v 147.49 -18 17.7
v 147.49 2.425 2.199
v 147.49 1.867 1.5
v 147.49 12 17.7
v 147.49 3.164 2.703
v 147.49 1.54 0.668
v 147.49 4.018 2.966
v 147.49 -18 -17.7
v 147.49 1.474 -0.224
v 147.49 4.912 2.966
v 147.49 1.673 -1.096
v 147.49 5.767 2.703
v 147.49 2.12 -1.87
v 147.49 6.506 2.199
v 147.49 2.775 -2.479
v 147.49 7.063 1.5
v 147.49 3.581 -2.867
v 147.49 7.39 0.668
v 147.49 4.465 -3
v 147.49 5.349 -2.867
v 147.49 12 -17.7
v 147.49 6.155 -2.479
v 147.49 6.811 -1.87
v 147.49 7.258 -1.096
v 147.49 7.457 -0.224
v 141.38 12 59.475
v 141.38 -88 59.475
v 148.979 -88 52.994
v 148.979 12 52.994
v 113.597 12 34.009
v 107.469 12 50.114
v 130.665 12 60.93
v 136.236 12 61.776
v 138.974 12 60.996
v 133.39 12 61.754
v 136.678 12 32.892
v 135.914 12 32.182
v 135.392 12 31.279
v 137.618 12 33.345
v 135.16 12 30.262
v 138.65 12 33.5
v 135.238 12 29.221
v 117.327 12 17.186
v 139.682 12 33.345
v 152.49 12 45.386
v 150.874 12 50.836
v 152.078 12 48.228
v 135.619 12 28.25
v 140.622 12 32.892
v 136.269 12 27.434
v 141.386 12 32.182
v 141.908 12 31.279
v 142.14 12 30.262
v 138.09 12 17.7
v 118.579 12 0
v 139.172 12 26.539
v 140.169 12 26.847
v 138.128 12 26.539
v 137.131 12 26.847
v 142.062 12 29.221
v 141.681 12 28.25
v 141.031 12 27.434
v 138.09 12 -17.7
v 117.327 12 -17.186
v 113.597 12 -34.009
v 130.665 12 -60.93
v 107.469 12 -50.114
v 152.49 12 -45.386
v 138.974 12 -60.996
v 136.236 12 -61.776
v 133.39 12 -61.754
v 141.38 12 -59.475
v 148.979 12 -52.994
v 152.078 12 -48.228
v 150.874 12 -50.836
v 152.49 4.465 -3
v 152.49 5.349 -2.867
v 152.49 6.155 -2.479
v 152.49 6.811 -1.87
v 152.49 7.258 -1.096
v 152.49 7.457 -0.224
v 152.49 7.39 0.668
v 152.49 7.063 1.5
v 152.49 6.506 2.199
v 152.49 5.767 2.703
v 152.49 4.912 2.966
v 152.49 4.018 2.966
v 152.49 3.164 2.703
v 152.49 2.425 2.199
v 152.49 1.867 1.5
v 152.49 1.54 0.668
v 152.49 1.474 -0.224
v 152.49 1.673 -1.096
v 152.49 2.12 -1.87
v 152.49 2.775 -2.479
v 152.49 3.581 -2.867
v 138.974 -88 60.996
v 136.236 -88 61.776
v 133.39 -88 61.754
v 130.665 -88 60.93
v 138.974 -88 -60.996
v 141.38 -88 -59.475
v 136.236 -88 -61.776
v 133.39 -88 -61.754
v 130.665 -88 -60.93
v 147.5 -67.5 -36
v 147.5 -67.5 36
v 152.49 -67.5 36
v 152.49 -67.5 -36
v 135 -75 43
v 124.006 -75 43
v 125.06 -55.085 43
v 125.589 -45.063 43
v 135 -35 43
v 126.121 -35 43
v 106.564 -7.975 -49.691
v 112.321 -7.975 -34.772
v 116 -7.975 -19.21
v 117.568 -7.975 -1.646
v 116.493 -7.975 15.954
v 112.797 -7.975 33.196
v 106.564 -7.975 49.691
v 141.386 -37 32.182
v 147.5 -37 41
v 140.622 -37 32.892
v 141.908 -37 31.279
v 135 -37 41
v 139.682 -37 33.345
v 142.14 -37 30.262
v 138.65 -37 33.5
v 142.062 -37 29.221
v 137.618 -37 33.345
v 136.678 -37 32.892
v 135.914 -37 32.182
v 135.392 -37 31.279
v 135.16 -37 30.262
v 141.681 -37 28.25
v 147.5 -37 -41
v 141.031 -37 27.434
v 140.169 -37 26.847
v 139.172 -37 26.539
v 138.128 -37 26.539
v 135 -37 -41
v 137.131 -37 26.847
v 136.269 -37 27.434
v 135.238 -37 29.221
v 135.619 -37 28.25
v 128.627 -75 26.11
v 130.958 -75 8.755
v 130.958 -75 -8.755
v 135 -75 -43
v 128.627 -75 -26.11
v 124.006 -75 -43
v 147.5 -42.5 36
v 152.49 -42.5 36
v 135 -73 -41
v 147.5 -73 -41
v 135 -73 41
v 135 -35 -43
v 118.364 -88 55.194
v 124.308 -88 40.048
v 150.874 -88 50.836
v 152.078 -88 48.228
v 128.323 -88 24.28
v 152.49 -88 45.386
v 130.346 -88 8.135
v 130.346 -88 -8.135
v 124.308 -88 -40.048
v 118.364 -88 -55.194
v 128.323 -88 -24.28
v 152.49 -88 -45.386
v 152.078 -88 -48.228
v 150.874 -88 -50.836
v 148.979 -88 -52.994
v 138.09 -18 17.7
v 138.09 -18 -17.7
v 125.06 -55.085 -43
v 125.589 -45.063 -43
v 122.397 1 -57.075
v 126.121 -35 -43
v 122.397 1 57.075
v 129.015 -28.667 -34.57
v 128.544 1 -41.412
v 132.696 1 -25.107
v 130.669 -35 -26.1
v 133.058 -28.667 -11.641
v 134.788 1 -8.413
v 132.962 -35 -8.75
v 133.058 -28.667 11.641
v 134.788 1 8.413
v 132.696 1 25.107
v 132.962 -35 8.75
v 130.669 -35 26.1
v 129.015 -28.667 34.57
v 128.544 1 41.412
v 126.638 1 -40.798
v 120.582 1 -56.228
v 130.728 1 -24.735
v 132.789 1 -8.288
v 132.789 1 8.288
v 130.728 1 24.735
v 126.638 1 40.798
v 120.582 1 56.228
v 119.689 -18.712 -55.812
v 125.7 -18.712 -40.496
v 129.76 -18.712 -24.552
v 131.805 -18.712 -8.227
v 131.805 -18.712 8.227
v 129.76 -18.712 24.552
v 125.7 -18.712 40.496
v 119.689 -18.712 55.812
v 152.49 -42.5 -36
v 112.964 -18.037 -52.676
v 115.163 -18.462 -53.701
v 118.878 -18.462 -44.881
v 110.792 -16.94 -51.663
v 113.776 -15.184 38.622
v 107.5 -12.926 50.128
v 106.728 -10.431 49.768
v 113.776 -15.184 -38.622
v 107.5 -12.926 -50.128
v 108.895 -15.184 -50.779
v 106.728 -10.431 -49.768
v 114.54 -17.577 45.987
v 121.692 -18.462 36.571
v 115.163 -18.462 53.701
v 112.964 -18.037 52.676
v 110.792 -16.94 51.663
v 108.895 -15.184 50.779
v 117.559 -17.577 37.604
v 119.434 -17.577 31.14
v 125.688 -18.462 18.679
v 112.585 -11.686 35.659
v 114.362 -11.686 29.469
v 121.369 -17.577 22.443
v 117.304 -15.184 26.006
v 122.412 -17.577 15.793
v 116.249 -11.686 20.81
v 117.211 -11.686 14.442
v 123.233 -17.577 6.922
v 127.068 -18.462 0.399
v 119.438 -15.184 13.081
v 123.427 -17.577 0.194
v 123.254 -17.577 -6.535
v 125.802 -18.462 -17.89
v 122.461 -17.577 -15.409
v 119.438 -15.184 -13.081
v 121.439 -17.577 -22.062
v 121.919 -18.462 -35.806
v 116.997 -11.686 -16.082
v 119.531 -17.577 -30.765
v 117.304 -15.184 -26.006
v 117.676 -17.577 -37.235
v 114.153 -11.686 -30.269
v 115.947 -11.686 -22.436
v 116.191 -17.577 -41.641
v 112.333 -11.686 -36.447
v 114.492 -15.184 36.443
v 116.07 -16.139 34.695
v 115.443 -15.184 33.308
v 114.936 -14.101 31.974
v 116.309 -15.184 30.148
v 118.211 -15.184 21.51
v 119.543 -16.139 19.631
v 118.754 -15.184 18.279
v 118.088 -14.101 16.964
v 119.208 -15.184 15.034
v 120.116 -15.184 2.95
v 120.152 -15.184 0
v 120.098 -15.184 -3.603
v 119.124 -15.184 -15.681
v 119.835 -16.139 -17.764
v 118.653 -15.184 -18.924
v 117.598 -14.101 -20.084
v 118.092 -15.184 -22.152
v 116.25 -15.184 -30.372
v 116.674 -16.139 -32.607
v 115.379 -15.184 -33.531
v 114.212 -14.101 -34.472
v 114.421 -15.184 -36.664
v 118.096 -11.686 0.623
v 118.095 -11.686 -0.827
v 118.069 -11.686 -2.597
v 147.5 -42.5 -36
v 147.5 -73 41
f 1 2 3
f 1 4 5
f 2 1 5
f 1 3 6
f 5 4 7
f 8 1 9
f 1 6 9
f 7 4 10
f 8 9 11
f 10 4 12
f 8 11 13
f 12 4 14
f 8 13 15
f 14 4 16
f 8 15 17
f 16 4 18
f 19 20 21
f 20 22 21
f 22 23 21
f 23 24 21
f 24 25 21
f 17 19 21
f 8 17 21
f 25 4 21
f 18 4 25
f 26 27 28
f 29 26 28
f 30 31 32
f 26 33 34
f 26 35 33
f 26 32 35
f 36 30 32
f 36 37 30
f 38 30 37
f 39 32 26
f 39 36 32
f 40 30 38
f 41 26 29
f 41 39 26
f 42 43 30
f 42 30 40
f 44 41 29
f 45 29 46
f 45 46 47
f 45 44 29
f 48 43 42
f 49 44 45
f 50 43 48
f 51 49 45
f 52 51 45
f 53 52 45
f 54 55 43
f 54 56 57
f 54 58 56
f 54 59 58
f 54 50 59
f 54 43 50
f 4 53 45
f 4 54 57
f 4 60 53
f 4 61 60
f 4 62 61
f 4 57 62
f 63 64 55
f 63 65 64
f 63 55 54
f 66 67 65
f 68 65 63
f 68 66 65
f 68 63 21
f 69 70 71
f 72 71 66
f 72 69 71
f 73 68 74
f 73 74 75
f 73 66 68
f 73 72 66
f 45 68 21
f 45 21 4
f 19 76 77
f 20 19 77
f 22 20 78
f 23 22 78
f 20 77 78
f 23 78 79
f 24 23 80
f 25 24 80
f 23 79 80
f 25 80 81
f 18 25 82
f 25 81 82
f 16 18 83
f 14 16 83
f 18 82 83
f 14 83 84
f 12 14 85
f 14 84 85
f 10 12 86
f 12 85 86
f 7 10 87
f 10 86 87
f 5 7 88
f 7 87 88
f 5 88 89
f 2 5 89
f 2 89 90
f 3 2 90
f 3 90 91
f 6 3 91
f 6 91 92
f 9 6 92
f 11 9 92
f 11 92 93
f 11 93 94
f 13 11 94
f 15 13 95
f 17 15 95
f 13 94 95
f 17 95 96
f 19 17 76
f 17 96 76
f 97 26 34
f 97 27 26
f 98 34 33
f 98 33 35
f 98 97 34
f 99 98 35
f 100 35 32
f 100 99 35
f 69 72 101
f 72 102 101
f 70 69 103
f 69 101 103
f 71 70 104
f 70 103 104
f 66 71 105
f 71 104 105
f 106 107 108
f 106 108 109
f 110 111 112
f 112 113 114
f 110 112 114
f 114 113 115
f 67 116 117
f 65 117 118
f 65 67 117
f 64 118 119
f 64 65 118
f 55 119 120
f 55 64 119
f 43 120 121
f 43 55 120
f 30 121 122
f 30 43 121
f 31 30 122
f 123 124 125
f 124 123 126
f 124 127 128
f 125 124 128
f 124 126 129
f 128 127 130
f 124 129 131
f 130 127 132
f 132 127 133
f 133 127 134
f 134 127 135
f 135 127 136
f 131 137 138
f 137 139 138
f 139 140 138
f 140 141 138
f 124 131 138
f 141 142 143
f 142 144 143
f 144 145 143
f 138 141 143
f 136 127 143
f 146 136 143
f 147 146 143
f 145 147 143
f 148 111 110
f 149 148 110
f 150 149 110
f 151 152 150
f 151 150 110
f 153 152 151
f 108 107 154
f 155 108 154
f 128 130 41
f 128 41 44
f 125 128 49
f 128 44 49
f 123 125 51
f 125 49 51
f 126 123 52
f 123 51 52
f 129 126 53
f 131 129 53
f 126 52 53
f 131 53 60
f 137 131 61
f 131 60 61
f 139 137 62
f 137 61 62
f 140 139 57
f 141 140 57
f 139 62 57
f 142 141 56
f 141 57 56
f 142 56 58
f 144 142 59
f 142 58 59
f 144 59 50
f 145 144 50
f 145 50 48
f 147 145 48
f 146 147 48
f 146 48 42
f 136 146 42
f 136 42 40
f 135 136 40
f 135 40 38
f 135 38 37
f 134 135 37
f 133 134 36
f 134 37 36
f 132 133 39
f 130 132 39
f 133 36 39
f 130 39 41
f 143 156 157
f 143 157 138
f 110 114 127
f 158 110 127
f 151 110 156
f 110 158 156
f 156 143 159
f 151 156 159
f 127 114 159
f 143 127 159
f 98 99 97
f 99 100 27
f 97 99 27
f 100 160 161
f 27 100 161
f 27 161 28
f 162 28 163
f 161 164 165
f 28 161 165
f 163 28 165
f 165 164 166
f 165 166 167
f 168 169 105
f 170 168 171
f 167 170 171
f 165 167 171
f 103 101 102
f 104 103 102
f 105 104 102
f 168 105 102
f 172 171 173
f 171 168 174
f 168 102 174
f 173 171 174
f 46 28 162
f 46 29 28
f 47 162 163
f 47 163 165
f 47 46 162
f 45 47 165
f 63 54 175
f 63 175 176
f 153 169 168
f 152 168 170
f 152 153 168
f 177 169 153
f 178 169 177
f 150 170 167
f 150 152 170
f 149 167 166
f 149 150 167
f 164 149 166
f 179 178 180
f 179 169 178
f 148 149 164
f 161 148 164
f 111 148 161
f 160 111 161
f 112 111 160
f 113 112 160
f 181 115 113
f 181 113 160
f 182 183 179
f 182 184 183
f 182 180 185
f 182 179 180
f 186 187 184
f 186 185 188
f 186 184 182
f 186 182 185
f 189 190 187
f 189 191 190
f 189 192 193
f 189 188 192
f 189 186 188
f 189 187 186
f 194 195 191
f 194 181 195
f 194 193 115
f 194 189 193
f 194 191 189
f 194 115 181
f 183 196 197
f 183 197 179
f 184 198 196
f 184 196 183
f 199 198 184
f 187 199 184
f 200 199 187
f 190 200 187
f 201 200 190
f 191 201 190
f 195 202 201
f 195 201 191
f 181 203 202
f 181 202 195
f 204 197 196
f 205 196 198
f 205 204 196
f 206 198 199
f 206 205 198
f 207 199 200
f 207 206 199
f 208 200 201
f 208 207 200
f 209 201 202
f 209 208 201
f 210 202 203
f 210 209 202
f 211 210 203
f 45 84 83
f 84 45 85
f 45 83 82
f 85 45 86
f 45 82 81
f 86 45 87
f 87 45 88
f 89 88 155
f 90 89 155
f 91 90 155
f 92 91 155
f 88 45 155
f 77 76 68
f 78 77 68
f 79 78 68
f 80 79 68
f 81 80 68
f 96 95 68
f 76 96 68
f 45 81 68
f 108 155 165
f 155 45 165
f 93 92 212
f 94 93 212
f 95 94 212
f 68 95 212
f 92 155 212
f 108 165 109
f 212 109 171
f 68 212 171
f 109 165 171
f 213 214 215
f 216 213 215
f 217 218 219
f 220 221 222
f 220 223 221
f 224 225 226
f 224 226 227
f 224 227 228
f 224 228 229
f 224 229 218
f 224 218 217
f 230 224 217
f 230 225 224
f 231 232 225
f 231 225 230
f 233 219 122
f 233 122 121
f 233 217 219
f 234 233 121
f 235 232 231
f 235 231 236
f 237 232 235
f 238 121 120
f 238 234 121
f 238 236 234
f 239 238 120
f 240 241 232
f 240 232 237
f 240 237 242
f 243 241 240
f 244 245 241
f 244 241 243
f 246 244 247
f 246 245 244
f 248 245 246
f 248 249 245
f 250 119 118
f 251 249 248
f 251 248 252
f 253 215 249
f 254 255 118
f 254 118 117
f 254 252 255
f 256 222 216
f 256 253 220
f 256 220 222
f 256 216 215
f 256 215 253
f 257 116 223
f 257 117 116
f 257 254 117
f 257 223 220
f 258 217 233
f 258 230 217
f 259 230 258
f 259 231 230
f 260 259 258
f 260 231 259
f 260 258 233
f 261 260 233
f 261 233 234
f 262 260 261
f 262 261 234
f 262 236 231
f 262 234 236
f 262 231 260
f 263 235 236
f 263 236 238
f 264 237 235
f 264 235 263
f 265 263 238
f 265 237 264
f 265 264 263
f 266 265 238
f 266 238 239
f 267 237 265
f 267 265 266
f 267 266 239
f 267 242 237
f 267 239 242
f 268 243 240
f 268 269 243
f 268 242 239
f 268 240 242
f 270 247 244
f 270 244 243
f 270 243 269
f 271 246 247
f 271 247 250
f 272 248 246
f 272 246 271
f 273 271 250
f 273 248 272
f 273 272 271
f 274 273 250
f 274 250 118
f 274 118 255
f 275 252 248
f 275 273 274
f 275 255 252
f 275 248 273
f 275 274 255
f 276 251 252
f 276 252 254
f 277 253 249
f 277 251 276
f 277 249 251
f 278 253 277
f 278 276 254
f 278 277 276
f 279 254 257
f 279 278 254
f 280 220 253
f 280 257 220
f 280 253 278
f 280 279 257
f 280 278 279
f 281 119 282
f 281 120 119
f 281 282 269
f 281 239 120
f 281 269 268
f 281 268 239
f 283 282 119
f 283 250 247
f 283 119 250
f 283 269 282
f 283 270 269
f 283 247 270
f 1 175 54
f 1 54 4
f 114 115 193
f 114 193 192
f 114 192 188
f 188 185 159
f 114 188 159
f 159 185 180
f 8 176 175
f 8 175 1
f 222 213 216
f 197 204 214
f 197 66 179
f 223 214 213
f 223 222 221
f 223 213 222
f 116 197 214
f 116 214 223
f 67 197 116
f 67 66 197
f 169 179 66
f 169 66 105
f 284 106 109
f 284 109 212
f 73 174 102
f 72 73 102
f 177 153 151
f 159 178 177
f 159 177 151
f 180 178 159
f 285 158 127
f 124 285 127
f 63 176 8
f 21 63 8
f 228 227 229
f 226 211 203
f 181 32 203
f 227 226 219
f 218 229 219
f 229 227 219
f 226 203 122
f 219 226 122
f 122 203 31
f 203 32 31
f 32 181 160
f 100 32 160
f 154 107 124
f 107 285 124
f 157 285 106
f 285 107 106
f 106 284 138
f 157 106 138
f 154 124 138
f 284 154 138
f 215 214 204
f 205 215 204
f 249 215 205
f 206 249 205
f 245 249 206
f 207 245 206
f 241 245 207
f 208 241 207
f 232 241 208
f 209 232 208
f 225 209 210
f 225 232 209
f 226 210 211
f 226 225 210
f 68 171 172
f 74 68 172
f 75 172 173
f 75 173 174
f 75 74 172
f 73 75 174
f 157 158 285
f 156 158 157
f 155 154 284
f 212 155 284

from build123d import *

# Parameters (mm, degrees)
REVOLU_O2_ANGLE          = 50
RESSALTO_EXTRUS_O1_START = -100
RESSALTO_EXTRUS_O1_DEPTH = 100
ESBO_O9_W                = 82
ESBO_O9_H                = 36
CORTE_EXTRUS_O6_DEPTH    = 147.5
ESBO_O11_W               = 72
ESBO_O11_H               = 25
CORTE_EXTRUS_O7_DEPTH    = 172
ESBO_O15_R               = 3.5
CORTE_EXTRUS_O8_DEPTH    = 49
ESBO_O16_W               = 86
ESBO_O16_H               = 40
ESBO_O16_W_2             = 82
ESBO_O16_H_2             = 36
CORTE_EXTRUS_O9_DEPTH    = 135
ESBO_O17_W               = 9.4
ESBO_O17_H               = 35.4
CORTE_EXTRUS_O10_DEPTH   = 30
ESBO_O18_R               = 3
CORTE_EXTRUS_O12_DEPTH   = 5
FILETE1_R                = 10


with BuildPart() as part:
    # Esboço1 → Revolução2 (revolve, symmetric)
    with BuildSketch(Plane.XY) as revolu_o2_sk:
        Polygon((133.047501561, 1), (132.06191984, -18.71163442), (117.080634756, -17.962570166), (118.578763265, 12), (150.6, 12), (150.6, -88), (130.6, -88), (135.05, 1), align=None)
    revolve(axis=Axis((0, -200, 0), (0, 1, 0)), revolution_arc=REVOLU_O2_ANGLE / 2)
    revolve(revolu_o2_sk.sketch, axis=Axis((0, -200, 0), (0, -1, 0)), revolution_arc=REVOLU_O2_ANGLE / 2)

    # Esboço10 → Ressalto-extrusão1 (add)
    with BuildSketch(Plane(origin=(0, 12, 0), x_dir=(1, 0, 0), z_dir=(0, 1, 0)).offset(RESSALTO_EXTRUS_O1_START)):
        with BuildLine():
            Line((152.489952728, 0), (150.6, 0))
            ThreePointArc((150.6, 0), (147.030178672, -32.595805859), (136.489952728, -63.646310218))
            Line((136.489952728, -63.646310218), (152.489952728, -50))
            Line((152.489952728, -50), (152.489952728, 0))
        make_face()
        with BuildLine():
            Line((152.489952728, 50), (136.489952728, 63.646310218))
            ThreePointArc((136.489952728, 63.646310218), (147.030178672, 32.595805859), (150.6, 0))
            Line((150.6, 0), (152.489952728, 0))
            Line((152.489952728, 0), (152.489952728, 50))
        make_face()
    extrude(amount=RESSALTO_EXTRUS_O1_DEPTH)

    # Esboço9 → Corte-extrusão6 (cut)
    with BuildSketch(Plane(origin=(0, 0, 0), x_dir=(0, 0, -1), z_dir=(1, 0, 0))):
        with Locations((0, -55)):
            Rectangle(ESBO_O9_W, ESBO_O9_H)
    extrude(amount=CORTE_EXTRUS_O6_DEPTH, mode=Mode.SUBTRACT)

    # Esboço11 → Corte-extrusão7 (cut)
    with BuildSketch(Plane(origin=(0, 0, 0), x_dir=(0, 0, -1), z_dir=(1, 0, 0))):
        with Locations((0, -55)):
            Rectangle(ESBO_O11_W, ESBO_O11_H)
    extrude(amount=CORTE_EXTRUS_O7_DEPTH, mode=Mode.SUBTRACT)

    # Esboço15 → Corte-extrusão8 (cut)
    with BuildSketch(Plane(origin=(0, 12, 0), x_dir=(1, 0, 0), z_dir=(0, 1, 0))):
        with Locations(Location((138.649952728, -30, 0), (0, 0, 270))):
            Circle(ESBO_O15_R)
    extrude(amount=-CORTE_EXTRUS_O8_DEPTH, mode=Mode.SUBTRACT)

    # Esboço16 → Corte-extrusão9 (cut)
    with BuildSketch(Plane(origin=(0, 0, 0), x_dir=(0, 0, -1), z_dir=(1, 0, 0))):
        with Locations((0, -55)):
            Rectangle(ESBO_O16_W, ESBO_O16_H)
        with Locations((0, -55)):
            Rectangle(ESBO_O16_W_2, ESBO_O16_H_2, mode=Mode.SUBTRACT)
    extrude(amount=CORTE_EXTRUS_O9_DEPTH, mode=Mode.SUBTRACT)

    # Esboço17 → Corte-extrusão10 (cut)
    with BuildSketch(Plane(origin=(0, 12, 0), x_dir=(1, 0, 0), z_dir=(0, 1, 0))):
        with Locations((142.789952728, 0)):
            Rectangle(ESBO_O17_W, ESBO_O17_H)
    extrude(amount=-CORTE_EXTRUS_O10_DEPTH, mode=Mode.SUBTRACT)

    # Esboço18 → Corte-extrusão12 (cut)
    with BuildSketch(Plane(origin=(152.489952728, 0, 0), x_dir=(0, 0, -1), z_dir=(1, 0, 0))):
        with Locations((0, 4.465209406)):
            Circle(ESBO_O18_R)
    extrude(amount=-CORTE_EXTRUS_O12_DEPTH, mode=Mode.SUBTRACT)

    # Filete1
    filete1_edges = [part.edges().sort_by_distance(p)[0] for p in [
        (117.080634756, -17.962570166, 0),
        (152.489952728, -38, -50),
        (152.489952728, -38, 50),
        (136.489952728, -38, -63.646310218),
        (136.489952728, -38, 63.646310218),
    ]]
    fillet(filete1_edges, radius=FILETE1_R)


solid = part.part
